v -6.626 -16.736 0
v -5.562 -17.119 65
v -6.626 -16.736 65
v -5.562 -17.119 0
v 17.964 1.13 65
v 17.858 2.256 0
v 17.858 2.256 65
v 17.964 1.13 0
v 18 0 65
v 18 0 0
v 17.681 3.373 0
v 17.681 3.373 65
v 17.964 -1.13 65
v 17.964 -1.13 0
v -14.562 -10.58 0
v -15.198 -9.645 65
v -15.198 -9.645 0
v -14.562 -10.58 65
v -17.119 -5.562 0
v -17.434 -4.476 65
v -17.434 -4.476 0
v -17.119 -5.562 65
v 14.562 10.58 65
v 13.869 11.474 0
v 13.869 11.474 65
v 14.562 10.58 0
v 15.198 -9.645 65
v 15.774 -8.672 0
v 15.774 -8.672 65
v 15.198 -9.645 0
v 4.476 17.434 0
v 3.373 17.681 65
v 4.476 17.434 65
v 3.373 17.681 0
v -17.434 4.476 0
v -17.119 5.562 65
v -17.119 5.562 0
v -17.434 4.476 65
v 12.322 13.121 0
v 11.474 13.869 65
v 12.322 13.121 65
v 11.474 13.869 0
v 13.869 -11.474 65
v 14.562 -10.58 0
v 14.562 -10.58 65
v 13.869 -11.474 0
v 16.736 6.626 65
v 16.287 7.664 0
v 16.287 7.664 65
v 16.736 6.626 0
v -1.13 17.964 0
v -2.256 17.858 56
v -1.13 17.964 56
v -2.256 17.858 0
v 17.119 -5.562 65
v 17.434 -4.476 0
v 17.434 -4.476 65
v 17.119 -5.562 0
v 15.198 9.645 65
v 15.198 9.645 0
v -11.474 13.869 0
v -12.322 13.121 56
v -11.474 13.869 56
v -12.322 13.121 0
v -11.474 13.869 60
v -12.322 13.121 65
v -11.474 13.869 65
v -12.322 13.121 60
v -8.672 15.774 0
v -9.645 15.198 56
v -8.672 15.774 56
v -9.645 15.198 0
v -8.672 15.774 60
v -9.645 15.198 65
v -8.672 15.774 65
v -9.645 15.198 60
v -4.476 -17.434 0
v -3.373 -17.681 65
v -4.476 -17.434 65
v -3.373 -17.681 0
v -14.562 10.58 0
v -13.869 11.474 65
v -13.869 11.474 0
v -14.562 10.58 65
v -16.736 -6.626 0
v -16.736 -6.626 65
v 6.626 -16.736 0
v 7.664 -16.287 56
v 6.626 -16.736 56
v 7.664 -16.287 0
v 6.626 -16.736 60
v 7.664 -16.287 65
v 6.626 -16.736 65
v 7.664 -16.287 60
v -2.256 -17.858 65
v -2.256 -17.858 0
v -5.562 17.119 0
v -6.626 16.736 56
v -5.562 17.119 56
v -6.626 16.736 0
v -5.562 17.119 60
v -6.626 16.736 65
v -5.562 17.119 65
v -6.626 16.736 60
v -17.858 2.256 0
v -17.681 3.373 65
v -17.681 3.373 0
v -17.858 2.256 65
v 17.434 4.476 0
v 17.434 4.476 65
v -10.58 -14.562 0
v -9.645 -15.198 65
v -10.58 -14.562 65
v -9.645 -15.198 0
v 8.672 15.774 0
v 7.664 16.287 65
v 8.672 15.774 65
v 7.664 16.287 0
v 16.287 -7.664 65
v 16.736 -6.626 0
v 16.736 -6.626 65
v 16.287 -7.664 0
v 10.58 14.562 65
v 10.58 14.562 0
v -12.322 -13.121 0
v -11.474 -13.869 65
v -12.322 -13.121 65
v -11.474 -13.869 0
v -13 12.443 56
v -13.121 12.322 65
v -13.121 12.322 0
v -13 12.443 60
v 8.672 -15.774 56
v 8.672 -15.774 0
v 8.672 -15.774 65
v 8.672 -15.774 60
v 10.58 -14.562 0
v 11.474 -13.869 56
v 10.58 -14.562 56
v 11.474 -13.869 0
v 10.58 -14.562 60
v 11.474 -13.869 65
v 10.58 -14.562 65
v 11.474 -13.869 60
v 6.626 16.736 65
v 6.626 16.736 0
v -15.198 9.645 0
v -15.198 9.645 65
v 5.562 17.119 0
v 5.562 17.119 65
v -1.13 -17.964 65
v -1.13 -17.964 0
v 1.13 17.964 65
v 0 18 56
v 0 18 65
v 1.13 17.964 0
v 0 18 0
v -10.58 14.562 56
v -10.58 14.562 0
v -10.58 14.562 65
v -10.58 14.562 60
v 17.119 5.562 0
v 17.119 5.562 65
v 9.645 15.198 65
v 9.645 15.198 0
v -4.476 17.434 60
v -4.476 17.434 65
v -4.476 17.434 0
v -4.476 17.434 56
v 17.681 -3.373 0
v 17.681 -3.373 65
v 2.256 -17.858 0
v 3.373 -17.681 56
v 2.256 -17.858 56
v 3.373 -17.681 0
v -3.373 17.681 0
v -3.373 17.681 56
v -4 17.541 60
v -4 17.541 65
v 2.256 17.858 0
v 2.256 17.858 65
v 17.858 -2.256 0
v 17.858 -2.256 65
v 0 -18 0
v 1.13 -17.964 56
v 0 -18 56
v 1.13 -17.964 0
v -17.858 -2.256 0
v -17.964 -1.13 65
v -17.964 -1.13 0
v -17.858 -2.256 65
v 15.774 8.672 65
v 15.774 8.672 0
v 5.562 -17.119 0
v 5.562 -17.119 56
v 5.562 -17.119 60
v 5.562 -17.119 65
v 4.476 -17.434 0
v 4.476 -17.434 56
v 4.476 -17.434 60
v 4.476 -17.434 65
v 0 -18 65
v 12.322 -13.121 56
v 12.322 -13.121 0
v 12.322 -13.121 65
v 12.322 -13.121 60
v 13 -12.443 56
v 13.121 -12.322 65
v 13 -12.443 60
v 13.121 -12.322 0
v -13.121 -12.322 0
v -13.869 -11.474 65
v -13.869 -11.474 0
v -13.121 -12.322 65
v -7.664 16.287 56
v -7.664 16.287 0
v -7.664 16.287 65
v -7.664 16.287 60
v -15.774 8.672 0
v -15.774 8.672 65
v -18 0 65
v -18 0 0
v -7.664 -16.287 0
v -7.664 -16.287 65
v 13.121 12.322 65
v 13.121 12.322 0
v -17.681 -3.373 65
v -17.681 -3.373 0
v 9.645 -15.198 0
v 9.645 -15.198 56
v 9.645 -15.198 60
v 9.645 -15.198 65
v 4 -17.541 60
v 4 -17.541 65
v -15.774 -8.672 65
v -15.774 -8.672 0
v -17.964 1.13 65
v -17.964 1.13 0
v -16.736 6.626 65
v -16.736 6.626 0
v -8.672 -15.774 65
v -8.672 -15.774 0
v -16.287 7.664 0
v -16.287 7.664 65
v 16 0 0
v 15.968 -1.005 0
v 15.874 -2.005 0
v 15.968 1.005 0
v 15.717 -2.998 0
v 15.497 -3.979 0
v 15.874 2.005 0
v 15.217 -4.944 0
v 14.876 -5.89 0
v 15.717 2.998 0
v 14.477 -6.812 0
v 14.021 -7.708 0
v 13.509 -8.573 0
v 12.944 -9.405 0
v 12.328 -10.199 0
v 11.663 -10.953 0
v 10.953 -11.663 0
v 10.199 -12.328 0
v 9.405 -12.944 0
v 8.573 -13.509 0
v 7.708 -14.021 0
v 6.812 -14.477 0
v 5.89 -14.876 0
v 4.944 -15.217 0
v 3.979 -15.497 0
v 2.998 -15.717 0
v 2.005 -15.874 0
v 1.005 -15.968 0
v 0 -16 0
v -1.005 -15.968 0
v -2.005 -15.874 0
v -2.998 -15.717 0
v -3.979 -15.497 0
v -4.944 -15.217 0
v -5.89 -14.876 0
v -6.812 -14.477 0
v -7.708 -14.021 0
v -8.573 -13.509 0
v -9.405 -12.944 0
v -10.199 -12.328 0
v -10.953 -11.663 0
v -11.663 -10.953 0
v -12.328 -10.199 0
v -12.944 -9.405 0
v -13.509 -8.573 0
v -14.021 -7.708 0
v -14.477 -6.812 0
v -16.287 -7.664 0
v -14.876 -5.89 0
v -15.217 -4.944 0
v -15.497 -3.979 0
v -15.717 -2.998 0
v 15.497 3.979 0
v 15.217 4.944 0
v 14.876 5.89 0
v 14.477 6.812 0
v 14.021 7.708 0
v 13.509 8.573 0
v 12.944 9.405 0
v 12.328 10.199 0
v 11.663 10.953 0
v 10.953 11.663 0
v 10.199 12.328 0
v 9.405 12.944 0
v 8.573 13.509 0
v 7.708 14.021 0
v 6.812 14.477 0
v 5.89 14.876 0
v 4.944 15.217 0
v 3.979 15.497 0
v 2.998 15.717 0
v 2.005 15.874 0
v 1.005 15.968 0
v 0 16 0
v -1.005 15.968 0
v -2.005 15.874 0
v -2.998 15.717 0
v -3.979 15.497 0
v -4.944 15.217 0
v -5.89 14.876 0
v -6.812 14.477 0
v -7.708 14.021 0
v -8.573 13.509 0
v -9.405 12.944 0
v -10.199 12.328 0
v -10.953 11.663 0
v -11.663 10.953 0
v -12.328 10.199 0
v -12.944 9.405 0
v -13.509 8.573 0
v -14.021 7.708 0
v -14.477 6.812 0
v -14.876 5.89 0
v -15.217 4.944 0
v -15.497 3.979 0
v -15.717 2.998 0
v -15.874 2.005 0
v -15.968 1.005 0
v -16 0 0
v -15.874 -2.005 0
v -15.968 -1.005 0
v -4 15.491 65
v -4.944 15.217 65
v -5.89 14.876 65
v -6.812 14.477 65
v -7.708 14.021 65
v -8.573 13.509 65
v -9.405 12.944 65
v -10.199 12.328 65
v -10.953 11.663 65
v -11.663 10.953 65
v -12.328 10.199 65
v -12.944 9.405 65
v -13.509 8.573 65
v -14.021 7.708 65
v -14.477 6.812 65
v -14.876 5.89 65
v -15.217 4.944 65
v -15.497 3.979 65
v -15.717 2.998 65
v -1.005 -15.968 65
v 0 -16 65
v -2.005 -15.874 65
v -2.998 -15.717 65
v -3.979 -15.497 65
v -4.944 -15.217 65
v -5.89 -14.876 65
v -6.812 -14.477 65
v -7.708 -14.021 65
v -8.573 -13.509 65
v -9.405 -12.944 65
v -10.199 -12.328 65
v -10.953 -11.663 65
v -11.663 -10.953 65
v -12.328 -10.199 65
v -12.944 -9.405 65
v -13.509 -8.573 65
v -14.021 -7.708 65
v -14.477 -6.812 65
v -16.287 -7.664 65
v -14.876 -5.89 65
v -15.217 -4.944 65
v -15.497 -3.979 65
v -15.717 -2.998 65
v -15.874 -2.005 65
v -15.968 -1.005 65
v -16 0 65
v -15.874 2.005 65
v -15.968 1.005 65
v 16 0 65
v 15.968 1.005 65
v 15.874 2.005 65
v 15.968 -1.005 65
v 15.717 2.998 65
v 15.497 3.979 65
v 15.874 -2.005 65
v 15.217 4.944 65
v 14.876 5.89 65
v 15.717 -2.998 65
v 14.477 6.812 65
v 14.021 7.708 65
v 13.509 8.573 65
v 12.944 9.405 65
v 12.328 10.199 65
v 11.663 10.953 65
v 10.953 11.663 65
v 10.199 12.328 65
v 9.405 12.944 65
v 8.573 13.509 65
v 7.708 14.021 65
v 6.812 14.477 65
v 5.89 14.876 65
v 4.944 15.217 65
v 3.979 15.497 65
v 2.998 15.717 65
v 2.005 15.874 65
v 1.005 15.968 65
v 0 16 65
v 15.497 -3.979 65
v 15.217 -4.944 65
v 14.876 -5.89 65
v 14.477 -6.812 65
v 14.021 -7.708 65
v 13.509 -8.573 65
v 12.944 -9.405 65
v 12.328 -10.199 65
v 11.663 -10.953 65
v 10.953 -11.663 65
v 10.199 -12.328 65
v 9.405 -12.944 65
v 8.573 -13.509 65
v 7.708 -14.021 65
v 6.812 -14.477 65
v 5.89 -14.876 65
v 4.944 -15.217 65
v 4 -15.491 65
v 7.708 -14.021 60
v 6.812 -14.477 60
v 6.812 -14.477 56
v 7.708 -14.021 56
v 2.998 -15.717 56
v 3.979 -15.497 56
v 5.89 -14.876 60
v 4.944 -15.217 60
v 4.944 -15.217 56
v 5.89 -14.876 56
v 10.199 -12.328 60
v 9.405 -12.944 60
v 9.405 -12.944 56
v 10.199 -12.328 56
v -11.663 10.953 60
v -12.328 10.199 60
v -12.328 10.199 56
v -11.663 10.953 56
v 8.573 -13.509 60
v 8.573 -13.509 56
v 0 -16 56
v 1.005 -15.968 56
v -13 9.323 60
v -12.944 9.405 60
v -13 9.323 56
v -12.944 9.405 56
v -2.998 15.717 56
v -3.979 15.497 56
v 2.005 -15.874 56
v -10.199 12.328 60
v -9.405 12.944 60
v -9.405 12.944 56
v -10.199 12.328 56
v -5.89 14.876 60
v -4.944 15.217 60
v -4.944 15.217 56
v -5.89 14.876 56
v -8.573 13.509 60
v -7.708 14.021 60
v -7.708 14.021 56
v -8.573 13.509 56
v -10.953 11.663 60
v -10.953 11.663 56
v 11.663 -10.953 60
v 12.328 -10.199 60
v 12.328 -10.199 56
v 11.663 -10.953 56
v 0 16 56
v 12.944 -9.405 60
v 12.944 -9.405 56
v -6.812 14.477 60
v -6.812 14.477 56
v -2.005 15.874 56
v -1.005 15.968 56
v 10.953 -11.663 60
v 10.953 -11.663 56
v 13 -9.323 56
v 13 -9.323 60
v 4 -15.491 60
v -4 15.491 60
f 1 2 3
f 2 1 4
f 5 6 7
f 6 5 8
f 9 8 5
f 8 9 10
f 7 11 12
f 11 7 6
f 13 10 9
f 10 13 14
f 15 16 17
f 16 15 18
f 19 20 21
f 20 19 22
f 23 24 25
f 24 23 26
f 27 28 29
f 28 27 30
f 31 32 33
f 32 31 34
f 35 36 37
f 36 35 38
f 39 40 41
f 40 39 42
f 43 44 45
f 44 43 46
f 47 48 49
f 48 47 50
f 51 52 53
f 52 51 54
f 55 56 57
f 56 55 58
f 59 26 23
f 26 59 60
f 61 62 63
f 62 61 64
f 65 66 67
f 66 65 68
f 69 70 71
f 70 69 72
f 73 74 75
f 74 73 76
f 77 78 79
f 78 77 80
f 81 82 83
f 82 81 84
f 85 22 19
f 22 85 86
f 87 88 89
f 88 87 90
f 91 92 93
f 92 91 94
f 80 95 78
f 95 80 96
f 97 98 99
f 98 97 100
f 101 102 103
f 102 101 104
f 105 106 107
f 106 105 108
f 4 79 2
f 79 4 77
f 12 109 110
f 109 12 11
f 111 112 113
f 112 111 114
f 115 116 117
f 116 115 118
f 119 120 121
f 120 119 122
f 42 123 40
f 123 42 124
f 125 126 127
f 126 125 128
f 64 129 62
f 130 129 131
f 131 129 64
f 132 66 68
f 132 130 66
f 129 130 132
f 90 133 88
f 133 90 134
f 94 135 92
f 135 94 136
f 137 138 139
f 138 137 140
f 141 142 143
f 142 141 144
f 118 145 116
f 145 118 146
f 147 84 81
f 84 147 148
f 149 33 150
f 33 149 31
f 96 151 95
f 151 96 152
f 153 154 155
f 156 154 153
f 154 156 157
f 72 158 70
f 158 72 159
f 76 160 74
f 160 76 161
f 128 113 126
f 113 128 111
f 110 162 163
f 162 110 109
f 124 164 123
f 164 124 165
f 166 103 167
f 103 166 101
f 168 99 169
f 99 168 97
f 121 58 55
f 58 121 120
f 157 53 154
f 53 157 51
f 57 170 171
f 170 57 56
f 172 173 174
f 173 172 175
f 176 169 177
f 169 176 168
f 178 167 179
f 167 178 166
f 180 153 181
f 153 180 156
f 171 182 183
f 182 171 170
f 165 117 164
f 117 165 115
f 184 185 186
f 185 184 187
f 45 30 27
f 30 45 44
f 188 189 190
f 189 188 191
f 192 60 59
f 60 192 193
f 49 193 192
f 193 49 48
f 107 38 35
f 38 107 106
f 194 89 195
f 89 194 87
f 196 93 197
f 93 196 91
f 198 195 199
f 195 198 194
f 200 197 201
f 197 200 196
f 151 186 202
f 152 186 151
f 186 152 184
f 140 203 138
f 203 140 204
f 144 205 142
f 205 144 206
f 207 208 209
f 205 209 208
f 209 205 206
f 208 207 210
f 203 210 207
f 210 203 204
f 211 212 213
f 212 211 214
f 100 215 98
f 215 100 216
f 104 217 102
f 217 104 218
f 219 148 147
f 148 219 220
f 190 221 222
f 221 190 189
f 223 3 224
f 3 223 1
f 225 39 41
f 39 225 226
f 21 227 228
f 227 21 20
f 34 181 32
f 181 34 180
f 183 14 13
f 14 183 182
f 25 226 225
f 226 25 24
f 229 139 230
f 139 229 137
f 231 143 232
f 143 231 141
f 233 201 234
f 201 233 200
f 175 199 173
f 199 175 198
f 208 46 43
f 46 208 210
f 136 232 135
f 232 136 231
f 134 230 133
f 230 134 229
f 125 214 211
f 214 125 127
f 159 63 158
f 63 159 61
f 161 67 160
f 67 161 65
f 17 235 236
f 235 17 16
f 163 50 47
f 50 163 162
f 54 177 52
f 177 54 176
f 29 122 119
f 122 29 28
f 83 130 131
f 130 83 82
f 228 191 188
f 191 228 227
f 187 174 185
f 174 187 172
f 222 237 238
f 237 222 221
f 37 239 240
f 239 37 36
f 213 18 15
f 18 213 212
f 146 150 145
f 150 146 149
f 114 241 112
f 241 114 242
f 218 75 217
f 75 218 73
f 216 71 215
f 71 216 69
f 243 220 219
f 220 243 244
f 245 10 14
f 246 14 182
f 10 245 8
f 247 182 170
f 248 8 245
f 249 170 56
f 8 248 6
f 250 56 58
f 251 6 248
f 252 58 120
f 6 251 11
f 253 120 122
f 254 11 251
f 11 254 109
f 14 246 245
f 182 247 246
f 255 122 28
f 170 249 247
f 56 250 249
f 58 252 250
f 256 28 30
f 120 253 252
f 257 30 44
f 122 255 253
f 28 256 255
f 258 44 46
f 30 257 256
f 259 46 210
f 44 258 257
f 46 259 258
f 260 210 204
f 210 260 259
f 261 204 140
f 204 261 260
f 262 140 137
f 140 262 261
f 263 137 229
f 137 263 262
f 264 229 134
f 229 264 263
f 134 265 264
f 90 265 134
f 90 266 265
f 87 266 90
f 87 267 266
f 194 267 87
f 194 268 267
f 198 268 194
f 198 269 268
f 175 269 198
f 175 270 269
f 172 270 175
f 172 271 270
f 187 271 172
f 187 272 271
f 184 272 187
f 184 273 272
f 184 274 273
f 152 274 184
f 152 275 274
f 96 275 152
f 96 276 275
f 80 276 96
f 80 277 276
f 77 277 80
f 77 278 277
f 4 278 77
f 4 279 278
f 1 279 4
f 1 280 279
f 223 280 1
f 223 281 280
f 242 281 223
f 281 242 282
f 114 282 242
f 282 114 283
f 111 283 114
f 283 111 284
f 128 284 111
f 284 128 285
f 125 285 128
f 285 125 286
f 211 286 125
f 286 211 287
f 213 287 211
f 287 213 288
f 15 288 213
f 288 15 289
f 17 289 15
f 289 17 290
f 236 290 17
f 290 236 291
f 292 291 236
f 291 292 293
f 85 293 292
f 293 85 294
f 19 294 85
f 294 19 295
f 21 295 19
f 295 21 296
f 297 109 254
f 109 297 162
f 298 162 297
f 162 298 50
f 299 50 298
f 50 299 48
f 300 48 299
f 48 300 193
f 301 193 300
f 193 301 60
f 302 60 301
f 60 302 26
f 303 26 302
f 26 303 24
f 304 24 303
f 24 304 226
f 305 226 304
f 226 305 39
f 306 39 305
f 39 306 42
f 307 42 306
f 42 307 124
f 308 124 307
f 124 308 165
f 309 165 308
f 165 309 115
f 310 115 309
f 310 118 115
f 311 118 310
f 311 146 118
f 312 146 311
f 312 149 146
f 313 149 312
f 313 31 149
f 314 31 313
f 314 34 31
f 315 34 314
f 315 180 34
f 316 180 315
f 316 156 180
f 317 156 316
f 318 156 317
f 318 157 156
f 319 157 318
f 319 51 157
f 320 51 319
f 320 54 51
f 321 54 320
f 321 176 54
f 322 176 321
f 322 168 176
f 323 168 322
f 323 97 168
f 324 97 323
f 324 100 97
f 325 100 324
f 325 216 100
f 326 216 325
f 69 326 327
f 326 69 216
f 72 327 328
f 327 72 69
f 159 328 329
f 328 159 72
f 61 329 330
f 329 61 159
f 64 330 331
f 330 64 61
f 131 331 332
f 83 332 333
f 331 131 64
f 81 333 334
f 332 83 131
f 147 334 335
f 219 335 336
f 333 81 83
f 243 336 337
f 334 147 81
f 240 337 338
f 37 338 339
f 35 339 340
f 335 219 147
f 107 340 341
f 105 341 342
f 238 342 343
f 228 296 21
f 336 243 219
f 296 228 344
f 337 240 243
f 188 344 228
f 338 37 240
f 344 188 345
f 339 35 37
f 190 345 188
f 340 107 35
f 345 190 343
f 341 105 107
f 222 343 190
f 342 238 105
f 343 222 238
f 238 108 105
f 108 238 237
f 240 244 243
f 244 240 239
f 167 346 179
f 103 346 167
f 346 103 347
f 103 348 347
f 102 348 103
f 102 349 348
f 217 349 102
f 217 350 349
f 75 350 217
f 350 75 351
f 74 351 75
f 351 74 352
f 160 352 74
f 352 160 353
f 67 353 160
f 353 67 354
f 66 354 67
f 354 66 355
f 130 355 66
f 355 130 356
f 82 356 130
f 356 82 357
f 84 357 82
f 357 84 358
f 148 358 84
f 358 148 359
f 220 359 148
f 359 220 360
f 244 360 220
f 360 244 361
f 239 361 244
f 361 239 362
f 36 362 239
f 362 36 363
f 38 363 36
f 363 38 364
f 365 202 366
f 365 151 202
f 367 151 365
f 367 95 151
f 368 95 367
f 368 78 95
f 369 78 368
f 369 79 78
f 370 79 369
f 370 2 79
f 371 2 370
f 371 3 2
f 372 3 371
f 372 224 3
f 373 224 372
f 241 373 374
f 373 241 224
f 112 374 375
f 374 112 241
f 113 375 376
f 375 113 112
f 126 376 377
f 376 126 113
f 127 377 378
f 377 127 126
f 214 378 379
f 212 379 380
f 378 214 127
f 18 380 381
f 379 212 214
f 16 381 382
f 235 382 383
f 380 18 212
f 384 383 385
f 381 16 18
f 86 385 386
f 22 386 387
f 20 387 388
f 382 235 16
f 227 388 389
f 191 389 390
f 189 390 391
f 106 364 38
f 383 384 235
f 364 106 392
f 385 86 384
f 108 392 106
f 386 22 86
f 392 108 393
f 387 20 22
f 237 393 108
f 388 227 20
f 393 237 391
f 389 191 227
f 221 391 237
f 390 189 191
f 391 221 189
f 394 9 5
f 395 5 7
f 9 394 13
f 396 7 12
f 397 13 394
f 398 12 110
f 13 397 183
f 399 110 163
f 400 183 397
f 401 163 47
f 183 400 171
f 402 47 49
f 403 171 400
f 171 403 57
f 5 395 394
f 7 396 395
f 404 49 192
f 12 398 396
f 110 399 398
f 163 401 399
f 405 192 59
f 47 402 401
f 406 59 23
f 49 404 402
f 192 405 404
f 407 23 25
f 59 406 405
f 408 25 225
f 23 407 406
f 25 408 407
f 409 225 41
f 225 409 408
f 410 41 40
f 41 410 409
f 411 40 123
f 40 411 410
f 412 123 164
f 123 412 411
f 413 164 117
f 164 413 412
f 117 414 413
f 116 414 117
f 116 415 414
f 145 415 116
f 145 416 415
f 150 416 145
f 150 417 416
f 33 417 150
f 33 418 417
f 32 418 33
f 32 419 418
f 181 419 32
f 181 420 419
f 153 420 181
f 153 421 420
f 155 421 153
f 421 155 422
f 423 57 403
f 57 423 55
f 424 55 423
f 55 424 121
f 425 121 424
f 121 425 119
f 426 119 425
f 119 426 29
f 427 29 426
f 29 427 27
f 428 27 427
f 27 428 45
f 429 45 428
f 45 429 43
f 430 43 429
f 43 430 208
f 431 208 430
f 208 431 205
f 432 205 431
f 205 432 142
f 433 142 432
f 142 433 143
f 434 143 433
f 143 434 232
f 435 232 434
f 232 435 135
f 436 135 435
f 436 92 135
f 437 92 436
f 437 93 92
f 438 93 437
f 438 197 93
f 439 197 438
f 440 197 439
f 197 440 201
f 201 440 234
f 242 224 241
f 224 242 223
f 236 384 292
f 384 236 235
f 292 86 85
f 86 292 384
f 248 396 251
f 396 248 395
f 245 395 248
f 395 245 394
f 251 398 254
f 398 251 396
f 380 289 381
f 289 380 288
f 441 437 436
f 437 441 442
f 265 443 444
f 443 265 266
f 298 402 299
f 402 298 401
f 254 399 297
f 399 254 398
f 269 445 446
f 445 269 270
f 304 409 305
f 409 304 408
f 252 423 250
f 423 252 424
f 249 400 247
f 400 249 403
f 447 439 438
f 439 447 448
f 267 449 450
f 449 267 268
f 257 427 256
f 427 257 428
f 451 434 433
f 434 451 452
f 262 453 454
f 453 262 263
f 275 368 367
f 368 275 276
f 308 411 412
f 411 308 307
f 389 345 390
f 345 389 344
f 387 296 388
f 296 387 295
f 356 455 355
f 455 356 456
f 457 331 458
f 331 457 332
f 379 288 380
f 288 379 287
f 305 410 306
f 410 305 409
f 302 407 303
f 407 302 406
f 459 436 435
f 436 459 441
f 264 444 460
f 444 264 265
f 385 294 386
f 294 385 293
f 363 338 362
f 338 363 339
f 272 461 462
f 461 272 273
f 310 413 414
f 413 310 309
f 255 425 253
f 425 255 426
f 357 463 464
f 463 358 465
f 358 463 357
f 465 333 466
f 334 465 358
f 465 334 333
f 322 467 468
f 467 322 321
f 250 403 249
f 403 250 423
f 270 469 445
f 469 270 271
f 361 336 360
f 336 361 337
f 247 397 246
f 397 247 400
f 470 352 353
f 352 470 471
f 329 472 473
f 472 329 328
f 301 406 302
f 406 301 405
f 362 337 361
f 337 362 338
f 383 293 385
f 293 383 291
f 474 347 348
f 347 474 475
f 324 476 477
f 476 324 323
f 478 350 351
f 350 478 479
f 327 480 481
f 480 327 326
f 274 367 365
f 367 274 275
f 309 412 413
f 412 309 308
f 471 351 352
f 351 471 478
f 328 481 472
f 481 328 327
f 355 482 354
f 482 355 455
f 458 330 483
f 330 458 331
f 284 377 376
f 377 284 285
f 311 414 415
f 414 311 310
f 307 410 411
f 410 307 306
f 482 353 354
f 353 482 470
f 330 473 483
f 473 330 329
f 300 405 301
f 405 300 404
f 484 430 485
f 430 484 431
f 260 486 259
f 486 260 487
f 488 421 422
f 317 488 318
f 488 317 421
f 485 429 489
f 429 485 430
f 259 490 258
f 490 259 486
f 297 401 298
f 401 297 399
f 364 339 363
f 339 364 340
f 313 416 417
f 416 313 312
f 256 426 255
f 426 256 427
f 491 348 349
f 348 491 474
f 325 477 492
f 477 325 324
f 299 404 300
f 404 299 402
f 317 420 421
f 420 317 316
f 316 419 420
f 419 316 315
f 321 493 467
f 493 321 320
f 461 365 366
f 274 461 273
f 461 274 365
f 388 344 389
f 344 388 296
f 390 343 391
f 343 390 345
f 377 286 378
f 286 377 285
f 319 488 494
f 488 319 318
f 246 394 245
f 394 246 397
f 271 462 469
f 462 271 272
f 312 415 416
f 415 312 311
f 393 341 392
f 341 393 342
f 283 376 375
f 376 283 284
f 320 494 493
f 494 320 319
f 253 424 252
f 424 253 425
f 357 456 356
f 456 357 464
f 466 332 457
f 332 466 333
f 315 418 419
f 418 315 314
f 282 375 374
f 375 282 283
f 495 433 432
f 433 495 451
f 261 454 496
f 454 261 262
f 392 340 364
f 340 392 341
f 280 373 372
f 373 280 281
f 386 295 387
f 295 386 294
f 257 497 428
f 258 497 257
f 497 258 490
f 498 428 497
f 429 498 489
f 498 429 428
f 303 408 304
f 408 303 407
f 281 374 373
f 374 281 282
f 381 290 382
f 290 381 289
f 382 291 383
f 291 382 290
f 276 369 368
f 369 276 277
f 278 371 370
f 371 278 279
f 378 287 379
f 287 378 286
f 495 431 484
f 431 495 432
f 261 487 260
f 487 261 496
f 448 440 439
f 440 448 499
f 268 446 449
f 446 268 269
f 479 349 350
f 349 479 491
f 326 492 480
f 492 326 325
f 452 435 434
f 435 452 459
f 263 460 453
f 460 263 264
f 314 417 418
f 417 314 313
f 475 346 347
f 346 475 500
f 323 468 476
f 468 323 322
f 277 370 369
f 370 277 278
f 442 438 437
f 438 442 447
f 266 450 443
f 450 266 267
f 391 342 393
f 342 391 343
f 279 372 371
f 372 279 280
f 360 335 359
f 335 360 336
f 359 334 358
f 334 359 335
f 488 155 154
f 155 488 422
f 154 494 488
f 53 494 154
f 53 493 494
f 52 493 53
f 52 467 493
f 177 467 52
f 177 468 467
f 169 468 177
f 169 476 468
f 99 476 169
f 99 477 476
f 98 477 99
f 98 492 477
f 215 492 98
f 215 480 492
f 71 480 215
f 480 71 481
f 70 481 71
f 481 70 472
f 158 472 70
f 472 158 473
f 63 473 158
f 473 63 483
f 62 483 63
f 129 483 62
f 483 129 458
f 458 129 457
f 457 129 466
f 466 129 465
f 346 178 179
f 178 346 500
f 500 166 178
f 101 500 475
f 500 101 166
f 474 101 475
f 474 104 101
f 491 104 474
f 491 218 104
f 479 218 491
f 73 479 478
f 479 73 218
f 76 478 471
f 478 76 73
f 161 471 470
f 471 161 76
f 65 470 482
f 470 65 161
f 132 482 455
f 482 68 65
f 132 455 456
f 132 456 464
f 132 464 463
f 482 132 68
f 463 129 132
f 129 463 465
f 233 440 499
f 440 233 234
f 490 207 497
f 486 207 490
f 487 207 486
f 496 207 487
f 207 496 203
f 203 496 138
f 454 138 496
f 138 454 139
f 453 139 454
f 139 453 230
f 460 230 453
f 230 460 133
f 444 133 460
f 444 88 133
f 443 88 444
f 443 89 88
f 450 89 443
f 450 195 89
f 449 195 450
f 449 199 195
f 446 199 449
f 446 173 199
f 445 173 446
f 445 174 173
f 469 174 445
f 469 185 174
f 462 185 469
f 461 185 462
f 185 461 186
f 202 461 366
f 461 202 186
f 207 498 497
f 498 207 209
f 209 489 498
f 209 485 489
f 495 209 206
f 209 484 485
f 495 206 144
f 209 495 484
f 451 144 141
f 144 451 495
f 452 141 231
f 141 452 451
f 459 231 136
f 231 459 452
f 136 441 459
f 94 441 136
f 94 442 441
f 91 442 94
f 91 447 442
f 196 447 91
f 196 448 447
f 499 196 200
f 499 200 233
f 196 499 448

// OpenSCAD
$fn = 100;
id1 = 32;
id2 = 32; // no taper

wallthickness = 2;
height = 65; // 5 longer than original

od1 = id1 + 2*wallthickness;
od2 = id2 + 2*wallthickness;

module tube() {
difference() {
    cylinder(d1 = od1, d2 = od2, h = height);
    translate([0, 0, -0.5]) cylinder(d1 = id1, d2 = id2, h = height + 1);
}
}


n1w = 4;
n1h = 9;
n1d = 4;

n2w = 13;
n2h = 4;
n2d = 10;


difference() {
    tube();
    translate([-n1w, (id1/2 - 2), height - n1h]) cube([n1w, n1d, n1h + 1]);
    translate([-n2w, (id1/2 - 8), height - n1h]) cube([n2w, n2d, n2h]); 
    
    translate([0, -id2/2 - 3, height - n1h]) cube([n1w, n1d, n1h + 1]);
    translate([0, -id2/2 - 3, height - n1h]) cube([n2w, n2d, n2h]); 
}
